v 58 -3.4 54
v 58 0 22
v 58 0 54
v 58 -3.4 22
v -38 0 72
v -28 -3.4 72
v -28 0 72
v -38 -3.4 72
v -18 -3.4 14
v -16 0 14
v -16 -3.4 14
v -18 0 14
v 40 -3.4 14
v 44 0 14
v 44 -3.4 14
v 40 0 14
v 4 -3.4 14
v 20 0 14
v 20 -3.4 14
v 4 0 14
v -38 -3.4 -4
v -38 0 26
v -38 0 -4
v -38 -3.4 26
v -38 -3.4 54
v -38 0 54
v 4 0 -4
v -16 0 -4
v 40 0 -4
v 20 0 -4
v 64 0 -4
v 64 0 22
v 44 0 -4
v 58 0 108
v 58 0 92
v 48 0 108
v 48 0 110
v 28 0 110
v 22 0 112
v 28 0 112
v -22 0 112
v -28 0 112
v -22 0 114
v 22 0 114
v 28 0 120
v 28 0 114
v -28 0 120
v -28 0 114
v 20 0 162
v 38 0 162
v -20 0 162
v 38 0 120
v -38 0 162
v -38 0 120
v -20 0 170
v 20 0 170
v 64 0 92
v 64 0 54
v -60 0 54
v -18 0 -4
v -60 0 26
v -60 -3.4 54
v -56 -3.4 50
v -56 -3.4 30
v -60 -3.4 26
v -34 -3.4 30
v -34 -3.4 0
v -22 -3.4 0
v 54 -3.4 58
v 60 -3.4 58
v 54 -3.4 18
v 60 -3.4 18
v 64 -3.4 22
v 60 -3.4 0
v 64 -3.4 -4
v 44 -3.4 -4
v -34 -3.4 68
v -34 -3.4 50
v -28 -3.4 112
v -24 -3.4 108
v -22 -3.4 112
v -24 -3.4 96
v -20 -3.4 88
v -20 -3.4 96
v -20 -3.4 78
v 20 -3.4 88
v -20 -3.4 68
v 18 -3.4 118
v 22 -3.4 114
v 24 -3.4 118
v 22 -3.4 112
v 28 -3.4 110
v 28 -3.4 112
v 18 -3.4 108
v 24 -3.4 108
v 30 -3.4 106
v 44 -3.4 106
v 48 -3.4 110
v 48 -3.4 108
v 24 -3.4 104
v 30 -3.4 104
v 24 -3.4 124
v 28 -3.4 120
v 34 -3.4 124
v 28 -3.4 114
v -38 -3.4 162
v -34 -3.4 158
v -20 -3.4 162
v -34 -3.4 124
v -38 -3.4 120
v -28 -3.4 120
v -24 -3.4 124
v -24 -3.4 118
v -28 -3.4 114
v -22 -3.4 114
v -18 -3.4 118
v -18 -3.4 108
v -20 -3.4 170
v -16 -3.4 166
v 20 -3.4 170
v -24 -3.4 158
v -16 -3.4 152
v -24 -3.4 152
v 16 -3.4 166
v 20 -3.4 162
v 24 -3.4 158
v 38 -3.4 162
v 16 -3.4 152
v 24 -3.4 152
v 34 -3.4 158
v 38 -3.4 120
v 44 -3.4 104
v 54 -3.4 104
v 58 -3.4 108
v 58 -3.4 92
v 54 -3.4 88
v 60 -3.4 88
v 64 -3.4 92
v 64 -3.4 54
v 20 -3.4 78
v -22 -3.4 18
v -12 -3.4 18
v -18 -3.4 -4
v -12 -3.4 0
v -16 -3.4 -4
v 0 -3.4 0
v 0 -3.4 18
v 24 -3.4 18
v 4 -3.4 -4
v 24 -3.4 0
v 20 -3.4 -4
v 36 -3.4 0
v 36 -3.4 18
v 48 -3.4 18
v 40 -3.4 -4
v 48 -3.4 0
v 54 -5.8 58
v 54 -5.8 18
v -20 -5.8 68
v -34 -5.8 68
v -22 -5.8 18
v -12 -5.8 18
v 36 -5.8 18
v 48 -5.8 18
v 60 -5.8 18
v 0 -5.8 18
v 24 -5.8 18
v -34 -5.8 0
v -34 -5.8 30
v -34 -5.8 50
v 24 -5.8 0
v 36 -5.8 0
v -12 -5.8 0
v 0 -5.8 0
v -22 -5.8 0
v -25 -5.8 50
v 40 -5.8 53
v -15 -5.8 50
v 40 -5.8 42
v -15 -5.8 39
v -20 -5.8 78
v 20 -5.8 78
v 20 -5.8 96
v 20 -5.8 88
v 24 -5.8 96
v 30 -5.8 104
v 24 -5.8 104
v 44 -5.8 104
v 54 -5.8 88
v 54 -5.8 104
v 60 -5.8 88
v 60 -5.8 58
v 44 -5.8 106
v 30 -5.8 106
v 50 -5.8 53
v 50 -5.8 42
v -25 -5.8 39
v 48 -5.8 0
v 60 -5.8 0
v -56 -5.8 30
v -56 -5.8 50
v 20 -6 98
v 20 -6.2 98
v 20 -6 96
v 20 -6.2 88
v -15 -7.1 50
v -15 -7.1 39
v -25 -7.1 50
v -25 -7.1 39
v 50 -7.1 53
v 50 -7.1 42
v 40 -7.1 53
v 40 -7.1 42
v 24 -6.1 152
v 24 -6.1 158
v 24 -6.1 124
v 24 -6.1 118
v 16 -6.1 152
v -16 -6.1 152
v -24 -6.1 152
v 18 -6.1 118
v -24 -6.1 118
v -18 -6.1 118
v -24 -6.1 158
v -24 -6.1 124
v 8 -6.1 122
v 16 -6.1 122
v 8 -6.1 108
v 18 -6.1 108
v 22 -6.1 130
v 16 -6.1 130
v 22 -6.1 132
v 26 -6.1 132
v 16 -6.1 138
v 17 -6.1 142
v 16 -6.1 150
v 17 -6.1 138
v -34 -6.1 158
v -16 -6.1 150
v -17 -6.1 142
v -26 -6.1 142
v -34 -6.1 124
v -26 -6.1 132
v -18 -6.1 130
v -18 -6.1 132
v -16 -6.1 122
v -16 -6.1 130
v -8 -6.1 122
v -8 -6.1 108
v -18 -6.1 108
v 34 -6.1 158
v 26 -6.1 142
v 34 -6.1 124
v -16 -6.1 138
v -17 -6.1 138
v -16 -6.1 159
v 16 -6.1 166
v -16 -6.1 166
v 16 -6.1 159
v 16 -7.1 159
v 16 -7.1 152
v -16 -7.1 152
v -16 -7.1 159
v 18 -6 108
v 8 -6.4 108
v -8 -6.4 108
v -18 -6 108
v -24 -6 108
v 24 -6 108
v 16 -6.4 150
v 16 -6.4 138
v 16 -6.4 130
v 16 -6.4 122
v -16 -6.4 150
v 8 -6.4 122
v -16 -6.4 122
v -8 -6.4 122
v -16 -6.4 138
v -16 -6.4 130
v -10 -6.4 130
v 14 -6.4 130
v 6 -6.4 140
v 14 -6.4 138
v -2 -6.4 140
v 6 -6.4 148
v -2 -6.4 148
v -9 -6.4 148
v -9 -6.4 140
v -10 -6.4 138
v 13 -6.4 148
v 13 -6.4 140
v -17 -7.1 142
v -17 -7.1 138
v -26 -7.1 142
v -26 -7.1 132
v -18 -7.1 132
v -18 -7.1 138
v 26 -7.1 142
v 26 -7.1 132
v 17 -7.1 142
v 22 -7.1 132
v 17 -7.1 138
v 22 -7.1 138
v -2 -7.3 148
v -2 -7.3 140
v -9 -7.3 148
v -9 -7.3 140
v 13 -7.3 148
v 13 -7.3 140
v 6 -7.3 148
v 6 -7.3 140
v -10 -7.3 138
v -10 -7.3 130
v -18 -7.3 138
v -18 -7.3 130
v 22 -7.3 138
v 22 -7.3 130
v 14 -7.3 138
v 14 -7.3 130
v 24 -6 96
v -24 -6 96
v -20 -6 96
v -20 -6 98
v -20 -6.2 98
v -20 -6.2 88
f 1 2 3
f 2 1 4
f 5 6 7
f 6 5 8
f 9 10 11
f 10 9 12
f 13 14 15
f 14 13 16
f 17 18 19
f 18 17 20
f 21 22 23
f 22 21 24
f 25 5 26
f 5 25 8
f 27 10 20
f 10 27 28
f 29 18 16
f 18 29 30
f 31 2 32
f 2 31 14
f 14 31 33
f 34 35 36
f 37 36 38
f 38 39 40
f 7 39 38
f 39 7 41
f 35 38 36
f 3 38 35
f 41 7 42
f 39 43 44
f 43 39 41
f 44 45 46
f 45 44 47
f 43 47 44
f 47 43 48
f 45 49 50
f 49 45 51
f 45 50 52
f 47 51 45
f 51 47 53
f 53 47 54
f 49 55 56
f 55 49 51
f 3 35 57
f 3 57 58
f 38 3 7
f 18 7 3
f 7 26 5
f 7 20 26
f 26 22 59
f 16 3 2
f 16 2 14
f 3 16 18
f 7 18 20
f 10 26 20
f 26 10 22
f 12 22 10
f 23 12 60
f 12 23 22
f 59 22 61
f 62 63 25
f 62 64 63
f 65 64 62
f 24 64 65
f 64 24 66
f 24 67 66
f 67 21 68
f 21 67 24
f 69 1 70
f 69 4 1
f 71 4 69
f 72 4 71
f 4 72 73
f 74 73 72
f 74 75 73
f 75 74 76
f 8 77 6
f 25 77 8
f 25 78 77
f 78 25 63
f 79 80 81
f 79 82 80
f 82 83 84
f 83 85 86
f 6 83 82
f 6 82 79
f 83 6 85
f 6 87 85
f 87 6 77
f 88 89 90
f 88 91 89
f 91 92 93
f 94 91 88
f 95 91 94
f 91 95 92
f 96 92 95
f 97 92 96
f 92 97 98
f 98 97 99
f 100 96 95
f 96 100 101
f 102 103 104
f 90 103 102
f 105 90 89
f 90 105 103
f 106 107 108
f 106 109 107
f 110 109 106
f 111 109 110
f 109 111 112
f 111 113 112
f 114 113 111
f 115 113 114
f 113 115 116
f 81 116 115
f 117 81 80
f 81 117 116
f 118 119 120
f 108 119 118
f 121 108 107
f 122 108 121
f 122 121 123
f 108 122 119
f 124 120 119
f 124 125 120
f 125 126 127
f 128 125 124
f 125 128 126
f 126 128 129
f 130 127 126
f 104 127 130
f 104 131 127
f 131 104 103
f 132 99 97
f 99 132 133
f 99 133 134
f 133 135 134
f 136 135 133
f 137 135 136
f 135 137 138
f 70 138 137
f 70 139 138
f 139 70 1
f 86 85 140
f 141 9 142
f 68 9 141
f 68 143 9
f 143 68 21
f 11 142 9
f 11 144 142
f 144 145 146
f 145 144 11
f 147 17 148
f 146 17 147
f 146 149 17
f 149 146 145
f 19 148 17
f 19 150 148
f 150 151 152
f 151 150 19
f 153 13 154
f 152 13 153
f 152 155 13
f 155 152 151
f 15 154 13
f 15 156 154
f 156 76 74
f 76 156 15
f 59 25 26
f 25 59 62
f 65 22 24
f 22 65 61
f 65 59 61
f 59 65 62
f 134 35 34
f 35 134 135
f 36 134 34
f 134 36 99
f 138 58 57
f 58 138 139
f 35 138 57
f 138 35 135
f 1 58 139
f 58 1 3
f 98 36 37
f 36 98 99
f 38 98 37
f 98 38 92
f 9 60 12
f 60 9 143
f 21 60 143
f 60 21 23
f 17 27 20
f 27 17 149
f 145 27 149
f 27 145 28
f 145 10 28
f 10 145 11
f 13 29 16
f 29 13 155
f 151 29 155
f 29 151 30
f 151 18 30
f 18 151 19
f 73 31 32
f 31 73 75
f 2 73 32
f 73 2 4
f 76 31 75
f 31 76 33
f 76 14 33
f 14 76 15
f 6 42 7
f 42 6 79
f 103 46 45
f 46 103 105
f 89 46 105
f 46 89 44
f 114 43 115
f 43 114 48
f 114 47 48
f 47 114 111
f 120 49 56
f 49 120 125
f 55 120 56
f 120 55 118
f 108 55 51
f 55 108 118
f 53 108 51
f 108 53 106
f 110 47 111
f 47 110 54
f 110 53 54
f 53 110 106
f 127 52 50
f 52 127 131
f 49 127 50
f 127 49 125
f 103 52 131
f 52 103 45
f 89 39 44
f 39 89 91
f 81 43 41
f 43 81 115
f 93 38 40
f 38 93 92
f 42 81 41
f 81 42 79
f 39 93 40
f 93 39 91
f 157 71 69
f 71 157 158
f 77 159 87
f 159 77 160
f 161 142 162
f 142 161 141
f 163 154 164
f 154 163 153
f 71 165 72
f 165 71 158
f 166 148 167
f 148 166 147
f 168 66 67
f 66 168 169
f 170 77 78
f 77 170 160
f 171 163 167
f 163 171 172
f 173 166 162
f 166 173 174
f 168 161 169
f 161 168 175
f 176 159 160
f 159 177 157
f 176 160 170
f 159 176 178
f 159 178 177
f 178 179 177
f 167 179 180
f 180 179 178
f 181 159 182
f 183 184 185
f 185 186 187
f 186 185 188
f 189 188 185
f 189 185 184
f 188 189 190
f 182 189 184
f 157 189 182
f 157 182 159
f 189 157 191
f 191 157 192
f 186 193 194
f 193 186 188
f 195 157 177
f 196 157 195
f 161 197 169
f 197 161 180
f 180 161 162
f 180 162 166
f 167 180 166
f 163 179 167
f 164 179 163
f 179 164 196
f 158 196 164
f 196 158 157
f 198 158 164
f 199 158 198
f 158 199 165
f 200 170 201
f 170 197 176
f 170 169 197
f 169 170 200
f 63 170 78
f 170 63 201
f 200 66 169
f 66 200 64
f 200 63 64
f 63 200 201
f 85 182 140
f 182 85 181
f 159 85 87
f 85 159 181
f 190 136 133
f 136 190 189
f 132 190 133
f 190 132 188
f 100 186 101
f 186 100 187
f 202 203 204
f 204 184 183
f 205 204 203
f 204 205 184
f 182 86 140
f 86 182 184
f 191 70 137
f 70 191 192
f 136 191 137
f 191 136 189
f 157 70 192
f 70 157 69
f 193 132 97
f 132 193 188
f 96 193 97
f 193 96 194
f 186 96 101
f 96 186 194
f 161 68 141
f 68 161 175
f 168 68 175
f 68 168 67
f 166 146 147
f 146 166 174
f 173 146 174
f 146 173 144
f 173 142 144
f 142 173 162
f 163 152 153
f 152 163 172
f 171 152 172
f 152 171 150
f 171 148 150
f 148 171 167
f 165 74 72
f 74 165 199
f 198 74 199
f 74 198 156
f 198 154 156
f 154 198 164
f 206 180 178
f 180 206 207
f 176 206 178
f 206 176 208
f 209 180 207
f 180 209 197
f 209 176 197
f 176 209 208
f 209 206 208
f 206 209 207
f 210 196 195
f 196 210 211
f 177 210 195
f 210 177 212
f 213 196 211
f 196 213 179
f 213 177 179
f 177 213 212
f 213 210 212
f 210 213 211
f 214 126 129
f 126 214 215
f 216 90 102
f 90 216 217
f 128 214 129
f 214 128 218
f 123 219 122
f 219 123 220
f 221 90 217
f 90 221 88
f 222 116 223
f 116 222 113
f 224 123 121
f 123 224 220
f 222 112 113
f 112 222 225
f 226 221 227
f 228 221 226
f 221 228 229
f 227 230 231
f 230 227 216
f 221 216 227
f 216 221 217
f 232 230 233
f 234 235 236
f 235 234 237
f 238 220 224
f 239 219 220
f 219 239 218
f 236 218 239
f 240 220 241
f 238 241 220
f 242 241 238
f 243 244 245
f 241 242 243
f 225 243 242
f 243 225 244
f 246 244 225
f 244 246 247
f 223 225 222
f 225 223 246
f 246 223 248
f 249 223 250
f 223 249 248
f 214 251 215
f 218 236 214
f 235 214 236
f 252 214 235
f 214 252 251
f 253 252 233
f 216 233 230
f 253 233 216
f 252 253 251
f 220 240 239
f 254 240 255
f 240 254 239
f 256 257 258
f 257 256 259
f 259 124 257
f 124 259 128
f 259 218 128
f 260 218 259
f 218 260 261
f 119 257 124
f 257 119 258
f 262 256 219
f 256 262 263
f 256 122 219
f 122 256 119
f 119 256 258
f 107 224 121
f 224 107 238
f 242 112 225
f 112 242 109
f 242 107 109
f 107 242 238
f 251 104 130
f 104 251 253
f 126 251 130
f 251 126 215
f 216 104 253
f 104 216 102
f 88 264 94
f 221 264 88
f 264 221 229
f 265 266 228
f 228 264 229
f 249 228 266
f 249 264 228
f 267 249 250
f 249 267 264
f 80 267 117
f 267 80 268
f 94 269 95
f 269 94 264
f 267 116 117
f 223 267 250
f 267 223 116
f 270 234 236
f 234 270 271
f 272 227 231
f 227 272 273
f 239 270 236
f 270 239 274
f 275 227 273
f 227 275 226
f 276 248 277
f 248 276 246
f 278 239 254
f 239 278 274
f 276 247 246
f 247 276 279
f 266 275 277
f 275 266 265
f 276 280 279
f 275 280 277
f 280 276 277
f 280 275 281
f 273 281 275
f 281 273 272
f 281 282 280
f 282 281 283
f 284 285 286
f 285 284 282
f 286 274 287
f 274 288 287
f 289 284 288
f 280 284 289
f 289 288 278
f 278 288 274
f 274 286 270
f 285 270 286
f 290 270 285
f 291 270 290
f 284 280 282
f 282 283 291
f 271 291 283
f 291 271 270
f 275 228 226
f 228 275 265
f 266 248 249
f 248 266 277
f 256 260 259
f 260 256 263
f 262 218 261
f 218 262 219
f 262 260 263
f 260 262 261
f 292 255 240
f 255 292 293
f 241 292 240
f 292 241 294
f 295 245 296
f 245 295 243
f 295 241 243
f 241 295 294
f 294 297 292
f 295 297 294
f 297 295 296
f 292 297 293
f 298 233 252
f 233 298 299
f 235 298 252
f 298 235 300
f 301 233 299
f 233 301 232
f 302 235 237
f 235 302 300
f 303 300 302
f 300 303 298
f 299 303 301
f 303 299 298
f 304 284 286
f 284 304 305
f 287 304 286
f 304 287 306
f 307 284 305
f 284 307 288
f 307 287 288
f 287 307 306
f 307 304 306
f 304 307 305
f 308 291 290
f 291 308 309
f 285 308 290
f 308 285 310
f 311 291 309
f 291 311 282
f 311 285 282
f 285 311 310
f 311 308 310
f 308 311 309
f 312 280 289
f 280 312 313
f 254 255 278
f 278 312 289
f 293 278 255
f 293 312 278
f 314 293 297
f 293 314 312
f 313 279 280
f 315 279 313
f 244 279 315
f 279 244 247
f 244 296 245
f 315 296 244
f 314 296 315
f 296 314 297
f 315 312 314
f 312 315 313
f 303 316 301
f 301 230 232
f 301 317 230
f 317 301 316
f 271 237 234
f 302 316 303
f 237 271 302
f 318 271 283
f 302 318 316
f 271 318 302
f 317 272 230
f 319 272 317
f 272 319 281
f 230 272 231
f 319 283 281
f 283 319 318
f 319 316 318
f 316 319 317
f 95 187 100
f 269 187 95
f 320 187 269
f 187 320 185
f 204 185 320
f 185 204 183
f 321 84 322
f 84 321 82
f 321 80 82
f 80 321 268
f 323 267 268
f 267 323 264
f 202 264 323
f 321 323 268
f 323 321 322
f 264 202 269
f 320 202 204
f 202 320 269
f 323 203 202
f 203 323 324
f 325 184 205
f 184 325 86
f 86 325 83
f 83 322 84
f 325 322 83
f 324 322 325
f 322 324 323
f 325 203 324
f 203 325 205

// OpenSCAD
// Lightbulb Marker - Version 002
// Rebuilt from the reference as a front-facing pixel-art marker.
// Changes from previous version:
// - Replaced standalone round bulb with orange pixel creature body.
// - Added white blocky backing/outline as a single printable base layer.
// - Added four legs, side protrusion, black square eyes, and small pixel bulb.
// - Kept all geometry as shallow extruded blocks for a printable 2.5D object.

eps = 0.01;
$fn = 32;

outline = 4.0;
back_depth = 3.4;
body_depth = 5.8;
detail_depth = 7.1;

white = [1.00, 1.00, 0.96];
orange = [0.84, 0.40, 0.26];
black = [0.02, 0.02, 0.02];
bulb_yellow = [1.00, 0.83, 0.42];
bulb_light = [1.00, 0.91, 0.58];
bulb_orange = [0.95, 0.56, 0.22];
bulb_red = [0.74, 0.28, 0.22];
base_gray = [0.63, 0.62, 0.56];
base_dark = [0.43, 0.43, 0.39];

// Rectangles are [x, z, width, height] in the front view.
body_rects = [
    [-34, 18, 88, 50],   // main body
    [-56, 30, 22, 20],   // left blocky protrusion
    [-20, 62, 64, 16],   // stepped upper back
    [20, 78, 34, 26],    // tall right shoulder
    [42, 58, 18, 30],    // right vertical face
    [30, 96, 14, 10],    // small top step
    [-34, 0, 12, 18],    // leg 1
    [-12, 0, 12, 18],    // leg 2
    [24, 0, 12, 18],     // leg 3
    [48, 0, 12, 18]      // leg 4
];

connector_rects = [
    [-24, 68, 52, 30],
    [-18, 88, 40, 16]
];

bulb_fill_rects = [
    [-24, 118, 48, 34],
    [-16, 152, 32, 14],
    [-34, 124, 10, 34],
    [24, 124, 10, 34],
    [-18, 108, 36, 12]
];

bulb_light_rects = [
    [-16, 122, 32, 28],
    [-8, 108, 16, 16]
];

bulb_base_rects = [
    [-24, 96, 48, 12],
    [-20, 88, 40, 10]
];

bulb_detail_rects = [
    [-16, 152, 32, 7],
    [-26, 132, 9, 10],
    [17, 132, 9, 10]
];

bulb_red_rects = [
    [-9, 140, 7, 8],
    [6, 140, 7, 8],
    [-18, 130, 8, 8],
    [14, 130, 8, 8]
];

eye_rects = [
    [-25, 39, 10, 11],
    [40, 42, 10, 11]
];

module front_block(x, z, w, h, depth) {
    translate([x, -depth, z])
        cube([w, depth, h]);
}

module rect_layer(rects, depth, col) {
    color(col)
        union() {
            for (r = rects)
                front_block(r[0], r[1], r[2], r[3], depth);
        }
}

module outline_layer(rects, depth, col, margin) {
    color(col)
        union() {
            for (r = rects)
                front_block(
                    r[0] - margin,
                    r[1] - margin,
                    r[2] + 2 * margin,
                    r[3] + 2 * margin,
                    depth
                );
        }
}

module white_backing() {
    union() {
        outline_layer(body_rects, back_depth, white, outline);
        outline_layer(connector_rects, back_depth, white, outline);
        outline_layer(bulb_fill_rects, back_depth, white, outline);
        outline_layer(bulb_base_rects, back_depth, white, outline);
    }
}

module orange_body() {
    rect_layer(body_rects, body_depth, orange);
    rect_layer(eye_rects, detail_depth, black);
}

module pixel_bulb() {
    rect_layer(bulb_fill_rects, body_depth + 0.3, bulb_yellow);
    rect_layer(bulb_light_rects, body_depth + 0.6, bulb_light);
    rect_layer([bulb_base_rects[0]], body_depth + 0.2, base_gray);
    rect_layer([bulb_base_rects[1]], body_depth + 0.4, base_dark);
    rect_layer(bulb_detail_rects, detail_depth, bulb_orange);
    rect_layer(bulb_red_rects, detail_depth + 0.2, bulb_red);
}

module model() {
    union() {
        white_backing();
        orange_body();
        pixel_bulb();
    }
}

model();
